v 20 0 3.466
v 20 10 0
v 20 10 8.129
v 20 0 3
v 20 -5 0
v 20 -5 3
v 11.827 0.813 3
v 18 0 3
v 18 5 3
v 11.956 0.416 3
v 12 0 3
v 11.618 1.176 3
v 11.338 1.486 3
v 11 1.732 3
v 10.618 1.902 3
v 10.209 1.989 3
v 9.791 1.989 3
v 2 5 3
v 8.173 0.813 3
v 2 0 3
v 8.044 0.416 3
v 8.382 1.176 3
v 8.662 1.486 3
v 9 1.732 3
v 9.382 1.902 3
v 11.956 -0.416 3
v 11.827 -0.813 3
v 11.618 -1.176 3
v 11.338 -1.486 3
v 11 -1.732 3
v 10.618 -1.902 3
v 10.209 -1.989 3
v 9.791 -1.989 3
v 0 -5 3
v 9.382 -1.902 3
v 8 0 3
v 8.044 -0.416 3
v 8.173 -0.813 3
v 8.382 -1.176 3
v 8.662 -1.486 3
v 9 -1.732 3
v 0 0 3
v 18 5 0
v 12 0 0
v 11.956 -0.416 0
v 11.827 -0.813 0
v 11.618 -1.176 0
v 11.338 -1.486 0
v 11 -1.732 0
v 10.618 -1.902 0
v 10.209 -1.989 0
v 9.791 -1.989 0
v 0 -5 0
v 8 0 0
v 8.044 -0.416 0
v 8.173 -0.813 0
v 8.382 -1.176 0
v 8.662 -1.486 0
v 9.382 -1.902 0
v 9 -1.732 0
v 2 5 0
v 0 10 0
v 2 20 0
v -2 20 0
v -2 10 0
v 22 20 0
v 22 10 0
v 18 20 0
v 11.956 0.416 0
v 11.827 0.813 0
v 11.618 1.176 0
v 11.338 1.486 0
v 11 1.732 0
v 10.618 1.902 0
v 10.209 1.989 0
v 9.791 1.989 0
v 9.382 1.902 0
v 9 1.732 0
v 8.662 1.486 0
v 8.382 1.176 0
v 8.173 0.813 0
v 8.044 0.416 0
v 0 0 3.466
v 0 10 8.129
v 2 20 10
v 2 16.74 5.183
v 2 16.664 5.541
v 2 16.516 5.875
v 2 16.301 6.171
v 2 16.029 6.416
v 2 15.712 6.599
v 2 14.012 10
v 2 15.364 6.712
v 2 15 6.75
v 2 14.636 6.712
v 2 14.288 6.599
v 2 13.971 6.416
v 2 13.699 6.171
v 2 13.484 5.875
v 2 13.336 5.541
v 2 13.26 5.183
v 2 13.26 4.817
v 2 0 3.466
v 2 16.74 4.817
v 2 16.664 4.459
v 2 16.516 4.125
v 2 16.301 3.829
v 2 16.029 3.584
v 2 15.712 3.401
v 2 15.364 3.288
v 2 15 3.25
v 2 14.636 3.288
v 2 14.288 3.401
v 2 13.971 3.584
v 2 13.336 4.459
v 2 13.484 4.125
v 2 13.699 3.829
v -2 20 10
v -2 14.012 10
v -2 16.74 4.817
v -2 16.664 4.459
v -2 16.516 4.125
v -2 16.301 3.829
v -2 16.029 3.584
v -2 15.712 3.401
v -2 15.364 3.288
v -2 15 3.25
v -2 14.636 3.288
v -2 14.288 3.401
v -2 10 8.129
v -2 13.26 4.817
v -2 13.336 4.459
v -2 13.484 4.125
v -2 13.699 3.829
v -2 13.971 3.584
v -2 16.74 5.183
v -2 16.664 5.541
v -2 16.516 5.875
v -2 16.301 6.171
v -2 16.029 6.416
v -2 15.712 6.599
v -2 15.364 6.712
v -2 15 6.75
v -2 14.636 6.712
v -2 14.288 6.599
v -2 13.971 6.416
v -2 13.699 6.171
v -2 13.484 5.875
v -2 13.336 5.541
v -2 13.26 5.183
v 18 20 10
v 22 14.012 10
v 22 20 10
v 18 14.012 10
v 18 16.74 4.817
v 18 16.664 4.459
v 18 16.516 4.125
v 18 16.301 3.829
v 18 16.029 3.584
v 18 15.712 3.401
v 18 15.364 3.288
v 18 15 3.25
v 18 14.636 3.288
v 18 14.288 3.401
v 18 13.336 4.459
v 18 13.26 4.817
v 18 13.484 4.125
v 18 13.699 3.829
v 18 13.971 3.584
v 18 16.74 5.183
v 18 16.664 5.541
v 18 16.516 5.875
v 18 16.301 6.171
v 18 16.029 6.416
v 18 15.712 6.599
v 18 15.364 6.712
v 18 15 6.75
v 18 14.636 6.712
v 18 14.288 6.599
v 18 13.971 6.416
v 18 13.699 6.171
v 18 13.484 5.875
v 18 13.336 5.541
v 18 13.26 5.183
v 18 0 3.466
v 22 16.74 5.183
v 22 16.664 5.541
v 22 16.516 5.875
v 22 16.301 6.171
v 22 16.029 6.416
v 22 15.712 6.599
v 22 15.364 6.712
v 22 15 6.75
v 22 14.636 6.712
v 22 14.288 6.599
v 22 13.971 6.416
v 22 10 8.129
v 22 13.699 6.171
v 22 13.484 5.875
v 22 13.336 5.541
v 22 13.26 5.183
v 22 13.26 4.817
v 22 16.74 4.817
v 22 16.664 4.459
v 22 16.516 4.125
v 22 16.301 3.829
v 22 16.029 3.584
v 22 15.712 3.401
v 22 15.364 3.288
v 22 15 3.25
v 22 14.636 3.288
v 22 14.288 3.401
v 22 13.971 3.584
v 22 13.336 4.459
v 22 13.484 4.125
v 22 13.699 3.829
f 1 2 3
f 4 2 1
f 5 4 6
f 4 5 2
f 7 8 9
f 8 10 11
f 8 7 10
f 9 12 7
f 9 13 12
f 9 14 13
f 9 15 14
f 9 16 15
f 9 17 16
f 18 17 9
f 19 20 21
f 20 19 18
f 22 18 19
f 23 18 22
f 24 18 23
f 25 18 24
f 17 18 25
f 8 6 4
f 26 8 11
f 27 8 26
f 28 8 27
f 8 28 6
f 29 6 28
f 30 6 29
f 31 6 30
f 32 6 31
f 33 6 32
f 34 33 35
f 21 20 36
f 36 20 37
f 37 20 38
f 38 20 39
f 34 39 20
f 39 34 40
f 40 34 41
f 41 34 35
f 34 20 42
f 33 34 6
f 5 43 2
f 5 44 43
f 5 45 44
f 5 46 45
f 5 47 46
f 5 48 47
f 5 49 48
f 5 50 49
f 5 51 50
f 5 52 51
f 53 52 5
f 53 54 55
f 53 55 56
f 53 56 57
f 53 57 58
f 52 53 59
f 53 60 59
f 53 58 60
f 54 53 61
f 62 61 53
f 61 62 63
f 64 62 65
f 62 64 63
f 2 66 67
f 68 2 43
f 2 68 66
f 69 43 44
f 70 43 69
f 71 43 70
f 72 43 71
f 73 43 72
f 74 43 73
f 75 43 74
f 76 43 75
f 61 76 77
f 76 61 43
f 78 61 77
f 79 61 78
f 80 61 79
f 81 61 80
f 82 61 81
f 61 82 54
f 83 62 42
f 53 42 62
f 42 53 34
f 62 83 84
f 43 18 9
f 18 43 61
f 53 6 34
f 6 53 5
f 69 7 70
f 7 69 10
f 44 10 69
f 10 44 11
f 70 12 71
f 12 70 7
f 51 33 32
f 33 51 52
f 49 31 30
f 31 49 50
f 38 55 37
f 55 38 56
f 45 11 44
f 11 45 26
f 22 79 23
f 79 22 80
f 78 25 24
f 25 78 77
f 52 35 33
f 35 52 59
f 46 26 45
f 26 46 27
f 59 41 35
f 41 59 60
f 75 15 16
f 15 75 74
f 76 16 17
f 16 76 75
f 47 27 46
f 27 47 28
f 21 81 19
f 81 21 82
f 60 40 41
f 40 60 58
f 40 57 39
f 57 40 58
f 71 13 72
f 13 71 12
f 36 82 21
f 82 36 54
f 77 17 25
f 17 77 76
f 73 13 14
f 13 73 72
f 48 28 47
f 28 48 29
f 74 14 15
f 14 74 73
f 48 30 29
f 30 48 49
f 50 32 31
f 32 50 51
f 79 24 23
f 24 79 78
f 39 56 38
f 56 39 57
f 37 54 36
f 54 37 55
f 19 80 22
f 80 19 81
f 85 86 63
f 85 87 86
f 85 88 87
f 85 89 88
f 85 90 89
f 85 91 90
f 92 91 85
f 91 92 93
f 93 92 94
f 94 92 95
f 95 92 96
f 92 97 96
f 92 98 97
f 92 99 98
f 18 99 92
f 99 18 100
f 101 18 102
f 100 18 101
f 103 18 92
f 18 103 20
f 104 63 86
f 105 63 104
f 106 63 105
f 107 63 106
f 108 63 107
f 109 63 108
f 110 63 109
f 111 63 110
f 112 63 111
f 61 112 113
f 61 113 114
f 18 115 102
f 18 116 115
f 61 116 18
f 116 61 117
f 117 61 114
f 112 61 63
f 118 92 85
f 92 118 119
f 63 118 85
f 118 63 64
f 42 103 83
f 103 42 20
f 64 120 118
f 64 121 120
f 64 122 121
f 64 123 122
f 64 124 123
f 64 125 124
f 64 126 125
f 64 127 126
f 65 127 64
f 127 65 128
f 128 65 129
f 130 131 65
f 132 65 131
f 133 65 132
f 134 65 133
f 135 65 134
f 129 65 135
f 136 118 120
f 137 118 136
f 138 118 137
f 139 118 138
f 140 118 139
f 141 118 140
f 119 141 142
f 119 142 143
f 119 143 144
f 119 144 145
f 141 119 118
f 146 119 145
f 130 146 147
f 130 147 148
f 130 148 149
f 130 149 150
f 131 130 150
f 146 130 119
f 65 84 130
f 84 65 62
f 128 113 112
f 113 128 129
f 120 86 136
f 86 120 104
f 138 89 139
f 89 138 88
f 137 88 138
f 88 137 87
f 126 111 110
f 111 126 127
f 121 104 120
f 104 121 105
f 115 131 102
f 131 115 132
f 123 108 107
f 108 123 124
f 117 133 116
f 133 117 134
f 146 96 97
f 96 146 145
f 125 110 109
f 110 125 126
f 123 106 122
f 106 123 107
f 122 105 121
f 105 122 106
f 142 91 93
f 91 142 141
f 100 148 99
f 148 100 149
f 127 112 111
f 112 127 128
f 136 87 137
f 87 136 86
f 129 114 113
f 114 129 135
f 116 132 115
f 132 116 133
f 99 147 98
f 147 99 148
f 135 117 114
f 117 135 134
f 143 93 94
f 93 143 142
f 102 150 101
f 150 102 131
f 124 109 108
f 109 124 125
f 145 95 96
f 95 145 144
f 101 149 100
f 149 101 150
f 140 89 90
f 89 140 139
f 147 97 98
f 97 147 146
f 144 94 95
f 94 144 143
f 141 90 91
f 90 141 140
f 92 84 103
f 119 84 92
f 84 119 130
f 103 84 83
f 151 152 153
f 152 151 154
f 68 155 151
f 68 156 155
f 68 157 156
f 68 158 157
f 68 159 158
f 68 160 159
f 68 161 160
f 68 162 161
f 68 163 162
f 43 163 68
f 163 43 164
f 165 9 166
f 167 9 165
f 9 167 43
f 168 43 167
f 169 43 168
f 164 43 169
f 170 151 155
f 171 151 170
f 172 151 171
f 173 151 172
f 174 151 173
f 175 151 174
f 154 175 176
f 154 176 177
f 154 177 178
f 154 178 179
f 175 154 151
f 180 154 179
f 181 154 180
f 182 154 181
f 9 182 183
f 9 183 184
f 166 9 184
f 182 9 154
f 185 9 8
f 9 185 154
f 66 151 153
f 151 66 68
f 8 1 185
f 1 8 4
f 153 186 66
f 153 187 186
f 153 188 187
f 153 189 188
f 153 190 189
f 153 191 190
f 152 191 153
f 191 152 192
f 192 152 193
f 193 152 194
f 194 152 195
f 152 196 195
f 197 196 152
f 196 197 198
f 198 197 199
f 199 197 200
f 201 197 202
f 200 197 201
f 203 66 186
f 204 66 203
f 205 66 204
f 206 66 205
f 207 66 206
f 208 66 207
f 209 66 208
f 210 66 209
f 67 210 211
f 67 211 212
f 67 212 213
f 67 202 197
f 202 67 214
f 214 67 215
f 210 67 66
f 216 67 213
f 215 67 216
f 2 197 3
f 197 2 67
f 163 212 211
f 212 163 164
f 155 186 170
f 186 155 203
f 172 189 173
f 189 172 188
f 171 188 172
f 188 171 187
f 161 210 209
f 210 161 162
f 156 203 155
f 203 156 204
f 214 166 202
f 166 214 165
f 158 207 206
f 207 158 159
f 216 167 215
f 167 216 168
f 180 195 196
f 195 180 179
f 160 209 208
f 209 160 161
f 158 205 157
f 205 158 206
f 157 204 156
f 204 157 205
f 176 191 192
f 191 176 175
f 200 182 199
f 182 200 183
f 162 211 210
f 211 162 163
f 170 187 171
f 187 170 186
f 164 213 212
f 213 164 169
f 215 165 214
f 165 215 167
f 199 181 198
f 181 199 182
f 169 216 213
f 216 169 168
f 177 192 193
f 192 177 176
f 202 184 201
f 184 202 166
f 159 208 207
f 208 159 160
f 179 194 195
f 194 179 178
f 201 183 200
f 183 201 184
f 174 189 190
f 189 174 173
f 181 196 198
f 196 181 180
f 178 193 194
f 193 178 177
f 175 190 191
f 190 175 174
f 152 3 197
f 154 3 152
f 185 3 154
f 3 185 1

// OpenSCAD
$fn=30;
translate([0,-5,0])
difference()
{
cube ([20,10,3]);
translate([10,5,-1]) cylinder(d=4,h=5);
}
difference()
{
	union()
		{
		cube ([2,20,10]);
		translate([-2,10,0]) cube ([2,10,10]);
		}
	translate([-4,15,5]) rotate ([0,90,0]) cylinder(d=3.5,h=7);
	translate([-3,-1,3]) rotate ([25,0,0]) cube([6,20,10]);
}

difference()
{
	union()
		{
		translate([18,0,0]) cube ([2,20,10]);
		translate([20,10,0]) cube ([2,10,10]);
		}
	translate([16,15,5]) rotate ([0,90,0]) cylinder(d=3.5,h=7);
	translate([17,-1,3]) rotate ([25,0,0]) cube([6,20,10]);
}
